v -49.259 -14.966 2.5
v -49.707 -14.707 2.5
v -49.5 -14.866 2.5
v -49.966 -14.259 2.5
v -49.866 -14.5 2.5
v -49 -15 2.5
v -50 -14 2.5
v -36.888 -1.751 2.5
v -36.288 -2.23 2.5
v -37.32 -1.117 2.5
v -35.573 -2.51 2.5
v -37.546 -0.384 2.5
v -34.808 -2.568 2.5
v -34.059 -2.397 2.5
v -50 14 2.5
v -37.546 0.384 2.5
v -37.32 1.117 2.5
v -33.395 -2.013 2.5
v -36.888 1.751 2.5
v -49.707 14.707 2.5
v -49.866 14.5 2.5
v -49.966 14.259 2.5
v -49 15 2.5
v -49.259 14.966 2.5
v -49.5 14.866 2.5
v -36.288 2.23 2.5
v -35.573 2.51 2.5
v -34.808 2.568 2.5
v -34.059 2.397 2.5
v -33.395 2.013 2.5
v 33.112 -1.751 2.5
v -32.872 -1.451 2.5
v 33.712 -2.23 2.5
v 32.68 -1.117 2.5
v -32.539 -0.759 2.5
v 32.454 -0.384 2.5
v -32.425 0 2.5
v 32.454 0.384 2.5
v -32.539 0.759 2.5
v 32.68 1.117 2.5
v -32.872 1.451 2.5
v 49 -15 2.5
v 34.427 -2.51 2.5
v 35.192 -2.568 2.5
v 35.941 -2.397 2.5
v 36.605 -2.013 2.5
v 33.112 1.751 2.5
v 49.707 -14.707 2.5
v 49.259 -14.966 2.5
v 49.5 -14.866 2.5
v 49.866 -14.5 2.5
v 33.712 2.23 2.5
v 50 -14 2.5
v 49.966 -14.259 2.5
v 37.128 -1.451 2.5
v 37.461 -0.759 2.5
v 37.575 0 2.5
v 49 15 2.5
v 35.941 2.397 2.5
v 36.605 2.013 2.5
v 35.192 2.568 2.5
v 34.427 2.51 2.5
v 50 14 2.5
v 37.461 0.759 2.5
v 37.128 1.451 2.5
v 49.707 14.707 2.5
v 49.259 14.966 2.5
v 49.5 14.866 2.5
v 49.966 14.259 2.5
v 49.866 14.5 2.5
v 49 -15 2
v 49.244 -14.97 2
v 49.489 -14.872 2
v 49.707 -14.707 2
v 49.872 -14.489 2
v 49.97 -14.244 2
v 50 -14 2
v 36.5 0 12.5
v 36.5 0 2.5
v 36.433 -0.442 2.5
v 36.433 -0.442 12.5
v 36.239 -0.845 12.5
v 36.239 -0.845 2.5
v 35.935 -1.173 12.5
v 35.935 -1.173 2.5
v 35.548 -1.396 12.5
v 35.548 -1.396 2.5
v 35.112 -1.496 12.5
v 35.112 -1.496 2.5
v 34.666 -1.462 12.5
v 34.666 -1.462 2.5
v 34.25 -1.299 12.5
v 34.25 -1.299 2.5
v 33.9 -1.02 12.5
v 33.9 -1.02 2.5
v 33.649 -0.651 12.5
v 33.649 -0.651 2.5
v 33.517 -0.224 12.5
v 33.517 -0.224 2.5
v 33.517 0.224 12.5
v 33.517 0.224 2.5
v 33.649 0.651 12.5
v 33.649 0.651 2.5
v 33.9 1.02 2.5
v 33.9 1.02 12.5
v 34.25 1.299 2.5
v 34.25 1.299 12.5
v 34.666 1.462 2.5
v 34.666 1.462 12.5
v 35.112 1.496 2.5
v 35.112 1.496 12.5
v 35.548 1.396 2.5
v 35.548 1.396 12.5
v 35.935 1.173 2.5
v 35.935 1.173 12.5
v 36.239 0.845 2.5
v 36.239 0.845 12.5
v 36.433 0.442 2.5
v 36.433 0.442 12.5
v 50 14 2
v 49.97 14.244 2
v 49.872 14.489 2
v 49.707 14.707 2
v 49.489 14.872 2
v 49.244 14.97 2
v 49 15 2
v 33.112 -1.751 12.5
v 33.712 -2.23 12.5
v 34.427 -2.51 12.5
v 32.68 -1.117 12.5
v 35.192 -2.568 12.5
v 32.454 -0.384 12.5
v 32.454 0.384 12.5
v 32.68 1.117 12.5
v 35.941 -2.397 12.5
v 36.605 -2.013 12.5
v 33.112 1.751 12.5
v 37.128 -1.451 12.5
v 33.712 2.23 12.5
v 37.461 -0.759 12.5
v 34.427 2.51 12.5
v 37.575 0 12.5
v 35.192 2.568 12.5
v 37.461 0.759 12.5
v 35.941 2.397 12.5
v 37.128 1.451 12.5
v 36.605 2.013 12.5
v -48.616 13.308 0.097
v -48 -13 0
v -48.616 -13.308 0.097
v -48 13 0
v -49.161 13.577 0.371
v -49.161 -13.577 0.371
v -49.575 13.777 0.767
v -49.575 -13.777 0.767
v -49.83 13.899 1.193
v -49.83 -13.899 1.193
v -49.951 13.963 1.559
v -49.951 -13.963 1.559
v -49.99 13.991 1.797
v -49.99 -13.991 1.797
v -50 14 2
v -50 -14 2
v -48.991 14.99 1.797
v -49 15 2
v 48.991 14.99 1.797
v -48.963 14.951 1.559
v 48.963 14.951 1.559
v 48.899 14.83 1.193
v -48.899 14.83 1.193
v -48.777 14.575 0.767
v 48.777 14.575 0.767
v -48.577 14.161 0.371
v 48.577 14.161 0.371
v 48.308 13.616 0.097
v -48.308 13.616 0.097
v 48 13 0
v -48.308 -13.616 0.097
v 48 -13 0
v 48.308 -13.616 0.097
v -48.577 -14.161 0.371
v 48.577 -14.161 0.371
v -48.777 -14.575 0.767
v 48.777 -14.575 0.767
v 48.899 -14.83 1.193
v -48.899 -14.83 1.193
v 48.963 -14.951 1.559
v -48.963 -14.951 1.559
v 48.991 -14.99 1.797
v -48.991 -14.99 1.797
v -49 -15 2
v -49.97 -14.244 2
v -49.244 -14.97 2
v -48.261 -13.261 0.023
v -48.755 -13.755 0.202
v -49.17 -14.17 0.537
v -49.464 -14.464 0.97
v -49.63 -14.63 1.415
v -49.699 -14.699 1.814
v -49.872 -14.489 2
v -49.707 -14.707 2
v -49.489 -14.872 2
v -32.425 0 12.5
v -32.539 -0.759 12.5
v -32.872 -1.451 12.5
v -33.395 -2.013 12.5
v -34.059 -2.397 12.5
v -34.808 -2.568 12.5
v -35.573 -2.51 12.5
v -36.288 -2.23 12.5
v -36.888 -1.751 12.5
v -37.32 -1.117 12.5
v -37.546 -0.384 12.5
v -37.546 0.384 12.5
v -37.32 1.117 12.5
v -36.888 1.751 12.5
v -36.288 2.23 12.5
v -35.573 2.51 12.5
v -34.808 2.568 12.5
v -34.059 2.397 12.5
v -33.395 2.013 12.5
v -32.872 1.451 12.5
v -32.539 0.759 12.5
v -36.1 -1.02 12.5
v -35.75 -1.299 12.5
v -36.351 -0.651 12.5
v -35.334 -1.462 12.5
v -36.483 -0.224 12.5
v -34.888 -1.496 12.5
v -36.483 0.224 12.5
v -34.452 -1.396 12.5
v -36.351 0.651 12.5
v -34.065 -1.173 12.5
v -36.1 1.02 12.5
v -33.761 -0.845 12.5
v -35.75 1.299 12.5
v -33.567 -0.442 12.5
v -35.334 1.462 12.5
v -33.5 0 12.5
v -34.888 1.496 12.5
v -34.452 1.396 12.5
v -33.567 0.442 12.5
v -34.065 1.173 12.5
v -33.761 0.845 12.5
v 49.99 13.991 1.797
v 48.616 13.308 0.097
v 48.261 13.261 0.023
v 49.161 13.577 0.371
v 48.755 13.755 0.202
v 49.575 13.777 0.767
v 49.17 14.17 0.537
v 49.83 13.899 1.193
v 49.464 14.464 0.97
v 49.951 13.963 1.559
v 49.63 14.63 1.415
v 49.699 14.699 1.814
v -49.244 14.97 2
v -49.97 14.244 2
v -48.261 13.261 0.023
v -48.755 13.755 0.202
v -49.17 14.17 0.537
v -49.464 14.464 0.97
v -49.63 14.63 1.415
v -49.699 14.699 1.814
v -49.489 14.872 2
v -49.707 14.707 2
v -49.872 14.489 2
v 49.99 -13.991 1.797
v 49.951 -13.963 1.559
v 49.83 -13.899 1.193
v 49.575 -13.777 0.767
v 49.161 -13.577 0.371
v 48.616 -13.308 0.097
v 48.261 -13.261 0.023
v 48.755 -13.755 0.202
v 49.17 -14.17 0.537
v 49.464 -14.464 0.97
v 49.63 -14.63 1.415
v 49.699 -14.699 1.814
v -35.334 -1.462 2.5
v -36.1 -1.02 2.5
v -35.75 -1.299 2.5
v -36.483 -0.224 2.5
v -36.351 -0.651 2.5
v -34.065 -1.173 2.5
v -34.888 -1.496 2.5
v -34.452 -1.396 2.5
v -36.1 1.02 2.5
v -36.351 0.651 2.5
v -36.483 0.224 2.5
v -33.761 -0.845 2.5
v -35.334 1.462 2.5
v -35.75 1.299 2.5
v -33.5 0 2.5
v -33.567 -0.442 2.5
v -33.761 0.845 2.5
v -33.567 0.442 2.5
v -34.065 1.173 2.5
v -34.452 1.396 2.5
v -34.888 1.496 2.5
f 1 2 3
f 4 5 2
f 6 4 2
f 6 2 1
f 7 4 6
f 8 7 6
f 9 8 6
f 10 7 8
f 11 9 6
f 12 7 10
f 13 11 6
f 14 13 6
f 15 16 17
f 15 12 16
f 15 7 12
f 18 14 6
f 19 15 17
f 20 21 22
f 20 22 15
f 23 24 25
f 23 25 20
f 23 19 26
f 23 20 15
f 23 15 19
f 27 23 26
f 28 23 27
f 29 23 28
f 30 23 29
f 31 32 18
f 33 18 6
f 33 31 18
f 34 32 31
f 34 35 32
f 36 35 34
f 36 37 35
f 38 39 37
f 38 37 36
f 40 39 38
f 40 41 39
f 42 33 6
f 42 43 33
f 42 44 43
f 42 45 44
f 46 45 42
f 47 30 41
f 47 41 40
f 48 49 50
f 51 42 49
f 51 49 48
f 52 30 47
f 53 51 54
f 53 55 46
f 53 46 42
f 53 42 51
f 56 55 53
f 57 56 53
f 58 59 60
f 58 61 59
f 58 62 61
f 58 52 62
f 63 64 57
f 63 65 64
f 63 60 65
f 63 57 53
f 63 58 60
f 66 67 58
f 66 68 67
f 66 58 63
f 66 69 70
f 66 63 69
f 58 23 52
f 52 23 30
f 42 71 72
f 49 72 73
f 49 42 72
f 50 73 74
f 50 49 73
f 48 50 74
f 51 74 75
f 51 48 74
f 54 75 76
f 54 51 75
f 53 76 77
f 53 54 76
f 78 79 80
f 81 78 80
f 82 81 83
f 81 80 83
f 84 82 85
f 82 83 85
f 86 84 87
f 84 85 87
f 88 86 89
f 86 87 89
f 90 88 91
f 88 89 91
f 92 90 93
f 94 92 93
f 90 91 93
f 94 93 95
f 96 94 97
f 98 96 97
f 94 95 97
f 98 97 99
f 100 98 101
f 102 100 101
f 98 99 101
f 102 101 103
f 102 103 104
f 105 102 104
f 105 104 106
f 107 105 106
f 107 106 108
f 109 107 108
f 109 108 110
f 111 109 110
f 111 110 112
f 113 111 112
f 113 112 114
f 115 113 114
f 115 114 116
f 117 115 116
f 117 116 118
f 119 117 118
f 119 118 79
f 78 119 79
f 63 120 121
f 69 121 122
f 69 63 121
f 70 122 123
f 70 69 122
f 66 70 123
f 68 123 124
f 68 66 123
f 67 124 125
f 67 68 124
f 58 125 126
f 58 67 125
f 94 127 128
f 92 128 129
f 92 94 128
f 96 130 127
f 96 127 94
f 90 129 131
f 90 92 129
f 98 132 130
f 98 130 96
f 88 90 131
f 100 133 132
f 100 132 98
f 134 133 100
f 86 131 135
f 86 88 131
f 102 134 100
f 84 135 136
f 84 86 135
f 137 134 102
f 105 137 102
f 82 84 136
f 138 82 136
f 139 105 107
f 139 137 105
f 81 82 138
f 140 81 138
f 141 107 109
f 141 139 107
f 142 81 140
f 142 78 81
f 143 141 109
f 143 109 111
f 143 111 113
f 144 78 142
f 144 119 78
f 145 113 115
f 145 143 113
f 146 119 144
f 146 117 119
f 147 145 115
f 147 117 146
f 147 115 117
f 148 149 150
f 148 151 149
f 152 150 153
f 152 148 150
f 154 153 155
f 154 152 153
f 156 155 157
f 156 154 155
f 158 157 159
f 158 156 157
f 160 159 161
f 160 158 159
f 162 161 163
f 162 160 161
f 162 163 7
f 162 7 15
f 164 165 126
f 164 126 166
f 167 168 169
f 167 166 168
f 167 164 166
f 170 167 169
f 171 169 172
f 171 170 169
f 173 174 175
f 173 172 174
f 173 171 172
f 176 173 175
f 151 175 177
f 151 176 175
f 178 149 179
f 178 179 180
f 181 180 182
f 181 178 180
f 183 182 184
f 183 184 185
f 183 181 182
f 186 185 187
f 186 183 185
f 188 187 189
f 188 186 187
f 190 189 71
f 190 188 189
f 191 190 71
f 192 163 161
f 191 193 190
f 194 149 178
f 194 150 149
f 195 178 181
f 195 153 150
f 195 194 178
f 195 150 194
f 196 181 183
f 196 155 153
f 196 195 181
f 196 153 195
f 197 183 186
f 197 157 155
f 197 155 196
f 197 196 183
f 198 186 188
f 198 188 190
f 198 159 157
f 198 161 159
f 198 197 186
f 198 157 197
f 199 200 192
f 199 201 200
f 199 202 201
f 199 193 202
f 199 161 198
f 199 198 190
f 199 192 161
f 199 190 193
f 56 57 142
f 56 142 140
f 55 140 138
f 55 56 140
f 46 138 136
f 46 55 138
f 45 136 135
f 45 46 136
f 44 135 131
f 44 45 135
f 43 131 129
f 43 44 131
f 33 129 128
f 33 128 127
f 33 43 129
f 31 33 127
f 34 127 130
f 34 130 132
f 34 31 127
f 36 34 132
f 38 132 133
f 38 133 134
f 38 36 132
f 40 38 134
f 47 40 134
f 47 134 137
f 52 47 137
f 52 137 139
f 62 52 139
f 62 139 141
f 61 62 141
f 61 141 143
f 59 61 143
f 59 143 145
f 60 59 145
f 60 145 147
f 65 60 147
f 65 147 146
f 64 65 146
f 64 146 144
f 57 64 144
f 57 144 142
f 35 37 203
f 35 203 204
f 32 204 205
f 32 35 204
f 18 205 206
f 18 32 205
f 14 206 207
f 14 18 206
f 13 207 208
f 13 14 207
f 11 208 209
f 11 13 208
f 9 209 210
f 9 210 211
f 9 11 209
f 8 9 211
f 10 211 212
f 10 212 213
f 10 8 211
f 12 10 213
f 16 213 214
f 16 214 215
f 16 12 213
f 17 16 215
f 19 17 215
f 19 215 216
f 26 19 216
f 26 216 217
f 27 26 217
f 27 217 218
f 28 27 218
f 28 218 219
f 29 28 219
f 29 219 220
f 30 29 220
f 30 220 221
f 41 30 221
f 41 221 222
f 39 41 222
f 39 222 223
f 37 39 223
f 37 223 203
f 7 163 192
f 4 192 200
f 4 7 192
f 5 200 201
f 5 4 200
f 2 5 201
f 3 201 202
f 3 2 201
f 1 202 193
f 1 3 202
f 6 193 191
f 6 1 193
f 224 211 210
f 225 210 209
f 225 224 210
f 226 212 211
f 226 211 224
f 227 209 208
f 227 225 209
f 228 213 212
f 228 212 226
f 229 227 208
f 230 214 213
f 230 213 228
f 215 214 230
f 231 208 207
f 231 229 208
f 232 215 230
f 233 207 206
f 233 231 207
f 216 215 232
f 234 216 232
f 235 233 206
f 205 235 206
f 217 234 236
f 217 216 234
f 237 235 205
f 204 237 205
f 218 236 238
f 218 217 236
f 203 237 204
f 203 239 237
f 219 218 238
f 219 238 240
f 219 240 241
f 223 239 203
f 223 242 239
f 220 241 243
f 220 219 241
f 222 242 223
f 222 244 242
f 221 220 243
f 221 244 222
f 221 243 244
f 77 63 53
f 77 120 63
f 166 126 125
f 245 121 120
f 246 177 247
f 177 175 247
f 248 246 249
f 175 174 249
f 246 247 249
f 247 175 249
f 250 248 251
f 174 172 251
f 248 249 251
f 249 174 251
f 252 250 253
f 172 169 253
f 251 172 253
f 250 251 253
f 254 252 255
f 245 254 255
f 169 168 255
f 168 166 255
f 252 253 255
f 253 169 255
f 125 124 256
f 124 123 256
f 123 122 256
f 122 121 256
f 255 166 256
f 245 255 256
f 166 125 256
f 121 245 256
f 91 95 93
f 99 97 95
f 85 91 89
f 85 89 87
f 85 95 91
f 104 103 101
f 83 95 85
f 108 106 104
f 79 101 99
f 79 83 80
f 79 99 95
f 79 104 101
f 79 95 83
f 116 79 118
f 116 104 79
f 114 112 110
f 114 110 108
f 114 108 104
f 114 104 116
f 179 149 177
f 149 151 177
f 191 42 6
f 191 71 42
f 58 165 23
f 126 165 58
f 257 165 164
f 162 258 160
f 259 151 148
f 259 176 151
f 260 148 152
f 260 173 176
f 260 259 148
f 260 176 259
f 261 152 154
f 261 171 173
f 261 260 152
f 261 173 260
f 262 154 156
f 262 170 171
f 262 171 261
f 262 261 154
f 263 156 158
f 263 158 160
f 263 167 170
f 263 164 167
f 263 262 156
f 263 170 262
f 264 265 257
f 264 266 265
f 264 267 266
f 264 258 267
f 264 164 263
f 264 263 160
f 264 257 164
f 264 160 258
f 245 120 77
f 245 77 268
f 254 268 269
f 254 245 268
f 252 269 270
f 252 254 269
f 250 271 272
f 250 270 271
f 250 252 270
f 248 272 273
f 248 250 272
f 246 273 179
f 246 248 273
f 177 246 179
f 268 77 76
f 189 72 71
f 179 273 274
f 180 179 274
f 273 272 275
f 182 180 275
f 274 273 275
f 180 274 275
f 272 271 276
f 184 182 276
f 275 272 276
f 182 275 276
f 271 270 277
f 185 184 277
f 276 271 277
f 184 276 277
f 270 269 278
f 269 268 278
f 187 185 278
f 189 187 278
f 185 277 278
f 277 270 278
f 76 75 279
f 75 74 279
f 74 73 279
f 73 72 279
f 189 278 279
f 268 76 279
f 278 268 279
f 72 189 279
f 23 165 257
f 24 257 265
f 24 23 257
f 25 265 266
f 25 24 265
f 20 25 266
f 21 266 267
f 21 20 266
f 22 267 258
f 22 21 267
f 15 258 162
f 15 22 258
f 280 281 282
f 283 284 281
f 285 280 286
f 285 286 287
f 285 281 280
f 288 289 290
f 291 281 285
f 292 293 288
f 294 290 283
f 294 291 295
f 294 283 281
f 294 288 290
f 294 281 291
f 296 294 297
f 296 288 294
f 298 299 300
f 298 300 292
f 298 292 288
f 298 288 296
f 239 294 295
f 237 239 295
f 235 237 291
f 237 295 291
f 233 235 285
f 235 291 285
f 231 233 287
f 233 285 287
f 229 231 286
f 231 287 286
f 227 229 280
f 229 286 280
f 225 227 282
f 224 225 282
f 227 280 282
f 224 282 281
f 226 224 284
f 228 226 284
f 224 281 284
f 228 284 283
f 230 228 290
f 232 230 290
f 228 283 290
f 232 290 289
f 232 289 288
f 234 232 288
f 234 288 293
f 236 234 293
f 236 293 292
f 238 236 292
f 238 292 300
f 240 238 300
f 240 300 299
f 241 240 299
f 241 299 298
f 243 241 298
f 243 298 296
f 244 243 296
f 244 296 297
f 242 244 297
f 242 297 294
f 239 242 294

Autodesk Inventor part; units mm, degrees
ref_plane "YZ Plane" through (0, 0, 0) normal (1, 0, 0) x (0, 1, 0)
ref_plane "XZ Plane" through (0, 0, 0) normal (0, 1, 0) x (-1, 0, 0)
ref_plane "XY Plane" through (0, 0, 0) normal (0, 0, 1) x (1, 0, 0)
sketch "Náčrt1" plane through (0, 0, 0) normal (0, 0, 1) x (1, 0, 0)
  line L0 (0, 21) -> (0, -21) projected
  line L1 (-70, 0) -> (70, 0) projected
  line L2 (-50, 15) -> (50, 15)
  line L3 (50, 15) -> (50, -15)
  line L4 (50, -15) -> (-50, -15)
  line L5 (-50, -15) -> (-50, 15)
  point P0 (0, 0)
  dimension "d0" = 100
  dimension "d1" = 30
extrude "Vysunutí1" add sketch "Náčrt1" along normal blind 2.5
sketch "Náčrt2" plane through (0, 0, 2.5) normal (0, 0, 1) x (1, 0, 0)
  line L0 (-50, -15) -> (50, -15) projected
  line L1 (50, -15) -> (50, 15) projected
  line L2 (50, 15) -> (-50, 15) projected
  line L3 (-50, 15) -> (-50, -15) projected
  line L4 (0, 21) -> (0, -21) projected
  line L5 (-70, 0) -> (70, 0) projected
  circle A0 centre (35, 0) radius 1.5
  circle A1 centre (35, 0) radius 2.575
  circle A2 centre (-35, 0) radius 1.5
  circle A3 centre (-35, 0) radius 2.575
  point P0 (0, 0)
  point P1 (50, 0)
  dimension "d11" = 3
  dimension "d12" = 5.15
  dimension "d13" = 15
fillet "Zaoblení1" radius 2 4 edges at (50, 0, 0) (0, 15, 0) (-50, 0, 0) (0, -15, 0)
fillet "Zaoblení2" radius 1 8 edges at (50, -15, 2.25) (49.4142, -14.4142, 0.5858) (50, 15, 2.25) (49.4142, 14.4142, 0.5858) (-50, 15, 2.25) (-49.4142, 14.4142, 0.5858) (-50, -15, 2.25) (-49.4142, -14.4142, 0.5858)
extrude "Vysunutí3" add sketch "Náčrt2" along normal blind 10 contours A3 L5 A2 | L5 A2 A3 | A1 L5 A0 | L5 A0 A1
properties part number "záslepka_3D tisk"
